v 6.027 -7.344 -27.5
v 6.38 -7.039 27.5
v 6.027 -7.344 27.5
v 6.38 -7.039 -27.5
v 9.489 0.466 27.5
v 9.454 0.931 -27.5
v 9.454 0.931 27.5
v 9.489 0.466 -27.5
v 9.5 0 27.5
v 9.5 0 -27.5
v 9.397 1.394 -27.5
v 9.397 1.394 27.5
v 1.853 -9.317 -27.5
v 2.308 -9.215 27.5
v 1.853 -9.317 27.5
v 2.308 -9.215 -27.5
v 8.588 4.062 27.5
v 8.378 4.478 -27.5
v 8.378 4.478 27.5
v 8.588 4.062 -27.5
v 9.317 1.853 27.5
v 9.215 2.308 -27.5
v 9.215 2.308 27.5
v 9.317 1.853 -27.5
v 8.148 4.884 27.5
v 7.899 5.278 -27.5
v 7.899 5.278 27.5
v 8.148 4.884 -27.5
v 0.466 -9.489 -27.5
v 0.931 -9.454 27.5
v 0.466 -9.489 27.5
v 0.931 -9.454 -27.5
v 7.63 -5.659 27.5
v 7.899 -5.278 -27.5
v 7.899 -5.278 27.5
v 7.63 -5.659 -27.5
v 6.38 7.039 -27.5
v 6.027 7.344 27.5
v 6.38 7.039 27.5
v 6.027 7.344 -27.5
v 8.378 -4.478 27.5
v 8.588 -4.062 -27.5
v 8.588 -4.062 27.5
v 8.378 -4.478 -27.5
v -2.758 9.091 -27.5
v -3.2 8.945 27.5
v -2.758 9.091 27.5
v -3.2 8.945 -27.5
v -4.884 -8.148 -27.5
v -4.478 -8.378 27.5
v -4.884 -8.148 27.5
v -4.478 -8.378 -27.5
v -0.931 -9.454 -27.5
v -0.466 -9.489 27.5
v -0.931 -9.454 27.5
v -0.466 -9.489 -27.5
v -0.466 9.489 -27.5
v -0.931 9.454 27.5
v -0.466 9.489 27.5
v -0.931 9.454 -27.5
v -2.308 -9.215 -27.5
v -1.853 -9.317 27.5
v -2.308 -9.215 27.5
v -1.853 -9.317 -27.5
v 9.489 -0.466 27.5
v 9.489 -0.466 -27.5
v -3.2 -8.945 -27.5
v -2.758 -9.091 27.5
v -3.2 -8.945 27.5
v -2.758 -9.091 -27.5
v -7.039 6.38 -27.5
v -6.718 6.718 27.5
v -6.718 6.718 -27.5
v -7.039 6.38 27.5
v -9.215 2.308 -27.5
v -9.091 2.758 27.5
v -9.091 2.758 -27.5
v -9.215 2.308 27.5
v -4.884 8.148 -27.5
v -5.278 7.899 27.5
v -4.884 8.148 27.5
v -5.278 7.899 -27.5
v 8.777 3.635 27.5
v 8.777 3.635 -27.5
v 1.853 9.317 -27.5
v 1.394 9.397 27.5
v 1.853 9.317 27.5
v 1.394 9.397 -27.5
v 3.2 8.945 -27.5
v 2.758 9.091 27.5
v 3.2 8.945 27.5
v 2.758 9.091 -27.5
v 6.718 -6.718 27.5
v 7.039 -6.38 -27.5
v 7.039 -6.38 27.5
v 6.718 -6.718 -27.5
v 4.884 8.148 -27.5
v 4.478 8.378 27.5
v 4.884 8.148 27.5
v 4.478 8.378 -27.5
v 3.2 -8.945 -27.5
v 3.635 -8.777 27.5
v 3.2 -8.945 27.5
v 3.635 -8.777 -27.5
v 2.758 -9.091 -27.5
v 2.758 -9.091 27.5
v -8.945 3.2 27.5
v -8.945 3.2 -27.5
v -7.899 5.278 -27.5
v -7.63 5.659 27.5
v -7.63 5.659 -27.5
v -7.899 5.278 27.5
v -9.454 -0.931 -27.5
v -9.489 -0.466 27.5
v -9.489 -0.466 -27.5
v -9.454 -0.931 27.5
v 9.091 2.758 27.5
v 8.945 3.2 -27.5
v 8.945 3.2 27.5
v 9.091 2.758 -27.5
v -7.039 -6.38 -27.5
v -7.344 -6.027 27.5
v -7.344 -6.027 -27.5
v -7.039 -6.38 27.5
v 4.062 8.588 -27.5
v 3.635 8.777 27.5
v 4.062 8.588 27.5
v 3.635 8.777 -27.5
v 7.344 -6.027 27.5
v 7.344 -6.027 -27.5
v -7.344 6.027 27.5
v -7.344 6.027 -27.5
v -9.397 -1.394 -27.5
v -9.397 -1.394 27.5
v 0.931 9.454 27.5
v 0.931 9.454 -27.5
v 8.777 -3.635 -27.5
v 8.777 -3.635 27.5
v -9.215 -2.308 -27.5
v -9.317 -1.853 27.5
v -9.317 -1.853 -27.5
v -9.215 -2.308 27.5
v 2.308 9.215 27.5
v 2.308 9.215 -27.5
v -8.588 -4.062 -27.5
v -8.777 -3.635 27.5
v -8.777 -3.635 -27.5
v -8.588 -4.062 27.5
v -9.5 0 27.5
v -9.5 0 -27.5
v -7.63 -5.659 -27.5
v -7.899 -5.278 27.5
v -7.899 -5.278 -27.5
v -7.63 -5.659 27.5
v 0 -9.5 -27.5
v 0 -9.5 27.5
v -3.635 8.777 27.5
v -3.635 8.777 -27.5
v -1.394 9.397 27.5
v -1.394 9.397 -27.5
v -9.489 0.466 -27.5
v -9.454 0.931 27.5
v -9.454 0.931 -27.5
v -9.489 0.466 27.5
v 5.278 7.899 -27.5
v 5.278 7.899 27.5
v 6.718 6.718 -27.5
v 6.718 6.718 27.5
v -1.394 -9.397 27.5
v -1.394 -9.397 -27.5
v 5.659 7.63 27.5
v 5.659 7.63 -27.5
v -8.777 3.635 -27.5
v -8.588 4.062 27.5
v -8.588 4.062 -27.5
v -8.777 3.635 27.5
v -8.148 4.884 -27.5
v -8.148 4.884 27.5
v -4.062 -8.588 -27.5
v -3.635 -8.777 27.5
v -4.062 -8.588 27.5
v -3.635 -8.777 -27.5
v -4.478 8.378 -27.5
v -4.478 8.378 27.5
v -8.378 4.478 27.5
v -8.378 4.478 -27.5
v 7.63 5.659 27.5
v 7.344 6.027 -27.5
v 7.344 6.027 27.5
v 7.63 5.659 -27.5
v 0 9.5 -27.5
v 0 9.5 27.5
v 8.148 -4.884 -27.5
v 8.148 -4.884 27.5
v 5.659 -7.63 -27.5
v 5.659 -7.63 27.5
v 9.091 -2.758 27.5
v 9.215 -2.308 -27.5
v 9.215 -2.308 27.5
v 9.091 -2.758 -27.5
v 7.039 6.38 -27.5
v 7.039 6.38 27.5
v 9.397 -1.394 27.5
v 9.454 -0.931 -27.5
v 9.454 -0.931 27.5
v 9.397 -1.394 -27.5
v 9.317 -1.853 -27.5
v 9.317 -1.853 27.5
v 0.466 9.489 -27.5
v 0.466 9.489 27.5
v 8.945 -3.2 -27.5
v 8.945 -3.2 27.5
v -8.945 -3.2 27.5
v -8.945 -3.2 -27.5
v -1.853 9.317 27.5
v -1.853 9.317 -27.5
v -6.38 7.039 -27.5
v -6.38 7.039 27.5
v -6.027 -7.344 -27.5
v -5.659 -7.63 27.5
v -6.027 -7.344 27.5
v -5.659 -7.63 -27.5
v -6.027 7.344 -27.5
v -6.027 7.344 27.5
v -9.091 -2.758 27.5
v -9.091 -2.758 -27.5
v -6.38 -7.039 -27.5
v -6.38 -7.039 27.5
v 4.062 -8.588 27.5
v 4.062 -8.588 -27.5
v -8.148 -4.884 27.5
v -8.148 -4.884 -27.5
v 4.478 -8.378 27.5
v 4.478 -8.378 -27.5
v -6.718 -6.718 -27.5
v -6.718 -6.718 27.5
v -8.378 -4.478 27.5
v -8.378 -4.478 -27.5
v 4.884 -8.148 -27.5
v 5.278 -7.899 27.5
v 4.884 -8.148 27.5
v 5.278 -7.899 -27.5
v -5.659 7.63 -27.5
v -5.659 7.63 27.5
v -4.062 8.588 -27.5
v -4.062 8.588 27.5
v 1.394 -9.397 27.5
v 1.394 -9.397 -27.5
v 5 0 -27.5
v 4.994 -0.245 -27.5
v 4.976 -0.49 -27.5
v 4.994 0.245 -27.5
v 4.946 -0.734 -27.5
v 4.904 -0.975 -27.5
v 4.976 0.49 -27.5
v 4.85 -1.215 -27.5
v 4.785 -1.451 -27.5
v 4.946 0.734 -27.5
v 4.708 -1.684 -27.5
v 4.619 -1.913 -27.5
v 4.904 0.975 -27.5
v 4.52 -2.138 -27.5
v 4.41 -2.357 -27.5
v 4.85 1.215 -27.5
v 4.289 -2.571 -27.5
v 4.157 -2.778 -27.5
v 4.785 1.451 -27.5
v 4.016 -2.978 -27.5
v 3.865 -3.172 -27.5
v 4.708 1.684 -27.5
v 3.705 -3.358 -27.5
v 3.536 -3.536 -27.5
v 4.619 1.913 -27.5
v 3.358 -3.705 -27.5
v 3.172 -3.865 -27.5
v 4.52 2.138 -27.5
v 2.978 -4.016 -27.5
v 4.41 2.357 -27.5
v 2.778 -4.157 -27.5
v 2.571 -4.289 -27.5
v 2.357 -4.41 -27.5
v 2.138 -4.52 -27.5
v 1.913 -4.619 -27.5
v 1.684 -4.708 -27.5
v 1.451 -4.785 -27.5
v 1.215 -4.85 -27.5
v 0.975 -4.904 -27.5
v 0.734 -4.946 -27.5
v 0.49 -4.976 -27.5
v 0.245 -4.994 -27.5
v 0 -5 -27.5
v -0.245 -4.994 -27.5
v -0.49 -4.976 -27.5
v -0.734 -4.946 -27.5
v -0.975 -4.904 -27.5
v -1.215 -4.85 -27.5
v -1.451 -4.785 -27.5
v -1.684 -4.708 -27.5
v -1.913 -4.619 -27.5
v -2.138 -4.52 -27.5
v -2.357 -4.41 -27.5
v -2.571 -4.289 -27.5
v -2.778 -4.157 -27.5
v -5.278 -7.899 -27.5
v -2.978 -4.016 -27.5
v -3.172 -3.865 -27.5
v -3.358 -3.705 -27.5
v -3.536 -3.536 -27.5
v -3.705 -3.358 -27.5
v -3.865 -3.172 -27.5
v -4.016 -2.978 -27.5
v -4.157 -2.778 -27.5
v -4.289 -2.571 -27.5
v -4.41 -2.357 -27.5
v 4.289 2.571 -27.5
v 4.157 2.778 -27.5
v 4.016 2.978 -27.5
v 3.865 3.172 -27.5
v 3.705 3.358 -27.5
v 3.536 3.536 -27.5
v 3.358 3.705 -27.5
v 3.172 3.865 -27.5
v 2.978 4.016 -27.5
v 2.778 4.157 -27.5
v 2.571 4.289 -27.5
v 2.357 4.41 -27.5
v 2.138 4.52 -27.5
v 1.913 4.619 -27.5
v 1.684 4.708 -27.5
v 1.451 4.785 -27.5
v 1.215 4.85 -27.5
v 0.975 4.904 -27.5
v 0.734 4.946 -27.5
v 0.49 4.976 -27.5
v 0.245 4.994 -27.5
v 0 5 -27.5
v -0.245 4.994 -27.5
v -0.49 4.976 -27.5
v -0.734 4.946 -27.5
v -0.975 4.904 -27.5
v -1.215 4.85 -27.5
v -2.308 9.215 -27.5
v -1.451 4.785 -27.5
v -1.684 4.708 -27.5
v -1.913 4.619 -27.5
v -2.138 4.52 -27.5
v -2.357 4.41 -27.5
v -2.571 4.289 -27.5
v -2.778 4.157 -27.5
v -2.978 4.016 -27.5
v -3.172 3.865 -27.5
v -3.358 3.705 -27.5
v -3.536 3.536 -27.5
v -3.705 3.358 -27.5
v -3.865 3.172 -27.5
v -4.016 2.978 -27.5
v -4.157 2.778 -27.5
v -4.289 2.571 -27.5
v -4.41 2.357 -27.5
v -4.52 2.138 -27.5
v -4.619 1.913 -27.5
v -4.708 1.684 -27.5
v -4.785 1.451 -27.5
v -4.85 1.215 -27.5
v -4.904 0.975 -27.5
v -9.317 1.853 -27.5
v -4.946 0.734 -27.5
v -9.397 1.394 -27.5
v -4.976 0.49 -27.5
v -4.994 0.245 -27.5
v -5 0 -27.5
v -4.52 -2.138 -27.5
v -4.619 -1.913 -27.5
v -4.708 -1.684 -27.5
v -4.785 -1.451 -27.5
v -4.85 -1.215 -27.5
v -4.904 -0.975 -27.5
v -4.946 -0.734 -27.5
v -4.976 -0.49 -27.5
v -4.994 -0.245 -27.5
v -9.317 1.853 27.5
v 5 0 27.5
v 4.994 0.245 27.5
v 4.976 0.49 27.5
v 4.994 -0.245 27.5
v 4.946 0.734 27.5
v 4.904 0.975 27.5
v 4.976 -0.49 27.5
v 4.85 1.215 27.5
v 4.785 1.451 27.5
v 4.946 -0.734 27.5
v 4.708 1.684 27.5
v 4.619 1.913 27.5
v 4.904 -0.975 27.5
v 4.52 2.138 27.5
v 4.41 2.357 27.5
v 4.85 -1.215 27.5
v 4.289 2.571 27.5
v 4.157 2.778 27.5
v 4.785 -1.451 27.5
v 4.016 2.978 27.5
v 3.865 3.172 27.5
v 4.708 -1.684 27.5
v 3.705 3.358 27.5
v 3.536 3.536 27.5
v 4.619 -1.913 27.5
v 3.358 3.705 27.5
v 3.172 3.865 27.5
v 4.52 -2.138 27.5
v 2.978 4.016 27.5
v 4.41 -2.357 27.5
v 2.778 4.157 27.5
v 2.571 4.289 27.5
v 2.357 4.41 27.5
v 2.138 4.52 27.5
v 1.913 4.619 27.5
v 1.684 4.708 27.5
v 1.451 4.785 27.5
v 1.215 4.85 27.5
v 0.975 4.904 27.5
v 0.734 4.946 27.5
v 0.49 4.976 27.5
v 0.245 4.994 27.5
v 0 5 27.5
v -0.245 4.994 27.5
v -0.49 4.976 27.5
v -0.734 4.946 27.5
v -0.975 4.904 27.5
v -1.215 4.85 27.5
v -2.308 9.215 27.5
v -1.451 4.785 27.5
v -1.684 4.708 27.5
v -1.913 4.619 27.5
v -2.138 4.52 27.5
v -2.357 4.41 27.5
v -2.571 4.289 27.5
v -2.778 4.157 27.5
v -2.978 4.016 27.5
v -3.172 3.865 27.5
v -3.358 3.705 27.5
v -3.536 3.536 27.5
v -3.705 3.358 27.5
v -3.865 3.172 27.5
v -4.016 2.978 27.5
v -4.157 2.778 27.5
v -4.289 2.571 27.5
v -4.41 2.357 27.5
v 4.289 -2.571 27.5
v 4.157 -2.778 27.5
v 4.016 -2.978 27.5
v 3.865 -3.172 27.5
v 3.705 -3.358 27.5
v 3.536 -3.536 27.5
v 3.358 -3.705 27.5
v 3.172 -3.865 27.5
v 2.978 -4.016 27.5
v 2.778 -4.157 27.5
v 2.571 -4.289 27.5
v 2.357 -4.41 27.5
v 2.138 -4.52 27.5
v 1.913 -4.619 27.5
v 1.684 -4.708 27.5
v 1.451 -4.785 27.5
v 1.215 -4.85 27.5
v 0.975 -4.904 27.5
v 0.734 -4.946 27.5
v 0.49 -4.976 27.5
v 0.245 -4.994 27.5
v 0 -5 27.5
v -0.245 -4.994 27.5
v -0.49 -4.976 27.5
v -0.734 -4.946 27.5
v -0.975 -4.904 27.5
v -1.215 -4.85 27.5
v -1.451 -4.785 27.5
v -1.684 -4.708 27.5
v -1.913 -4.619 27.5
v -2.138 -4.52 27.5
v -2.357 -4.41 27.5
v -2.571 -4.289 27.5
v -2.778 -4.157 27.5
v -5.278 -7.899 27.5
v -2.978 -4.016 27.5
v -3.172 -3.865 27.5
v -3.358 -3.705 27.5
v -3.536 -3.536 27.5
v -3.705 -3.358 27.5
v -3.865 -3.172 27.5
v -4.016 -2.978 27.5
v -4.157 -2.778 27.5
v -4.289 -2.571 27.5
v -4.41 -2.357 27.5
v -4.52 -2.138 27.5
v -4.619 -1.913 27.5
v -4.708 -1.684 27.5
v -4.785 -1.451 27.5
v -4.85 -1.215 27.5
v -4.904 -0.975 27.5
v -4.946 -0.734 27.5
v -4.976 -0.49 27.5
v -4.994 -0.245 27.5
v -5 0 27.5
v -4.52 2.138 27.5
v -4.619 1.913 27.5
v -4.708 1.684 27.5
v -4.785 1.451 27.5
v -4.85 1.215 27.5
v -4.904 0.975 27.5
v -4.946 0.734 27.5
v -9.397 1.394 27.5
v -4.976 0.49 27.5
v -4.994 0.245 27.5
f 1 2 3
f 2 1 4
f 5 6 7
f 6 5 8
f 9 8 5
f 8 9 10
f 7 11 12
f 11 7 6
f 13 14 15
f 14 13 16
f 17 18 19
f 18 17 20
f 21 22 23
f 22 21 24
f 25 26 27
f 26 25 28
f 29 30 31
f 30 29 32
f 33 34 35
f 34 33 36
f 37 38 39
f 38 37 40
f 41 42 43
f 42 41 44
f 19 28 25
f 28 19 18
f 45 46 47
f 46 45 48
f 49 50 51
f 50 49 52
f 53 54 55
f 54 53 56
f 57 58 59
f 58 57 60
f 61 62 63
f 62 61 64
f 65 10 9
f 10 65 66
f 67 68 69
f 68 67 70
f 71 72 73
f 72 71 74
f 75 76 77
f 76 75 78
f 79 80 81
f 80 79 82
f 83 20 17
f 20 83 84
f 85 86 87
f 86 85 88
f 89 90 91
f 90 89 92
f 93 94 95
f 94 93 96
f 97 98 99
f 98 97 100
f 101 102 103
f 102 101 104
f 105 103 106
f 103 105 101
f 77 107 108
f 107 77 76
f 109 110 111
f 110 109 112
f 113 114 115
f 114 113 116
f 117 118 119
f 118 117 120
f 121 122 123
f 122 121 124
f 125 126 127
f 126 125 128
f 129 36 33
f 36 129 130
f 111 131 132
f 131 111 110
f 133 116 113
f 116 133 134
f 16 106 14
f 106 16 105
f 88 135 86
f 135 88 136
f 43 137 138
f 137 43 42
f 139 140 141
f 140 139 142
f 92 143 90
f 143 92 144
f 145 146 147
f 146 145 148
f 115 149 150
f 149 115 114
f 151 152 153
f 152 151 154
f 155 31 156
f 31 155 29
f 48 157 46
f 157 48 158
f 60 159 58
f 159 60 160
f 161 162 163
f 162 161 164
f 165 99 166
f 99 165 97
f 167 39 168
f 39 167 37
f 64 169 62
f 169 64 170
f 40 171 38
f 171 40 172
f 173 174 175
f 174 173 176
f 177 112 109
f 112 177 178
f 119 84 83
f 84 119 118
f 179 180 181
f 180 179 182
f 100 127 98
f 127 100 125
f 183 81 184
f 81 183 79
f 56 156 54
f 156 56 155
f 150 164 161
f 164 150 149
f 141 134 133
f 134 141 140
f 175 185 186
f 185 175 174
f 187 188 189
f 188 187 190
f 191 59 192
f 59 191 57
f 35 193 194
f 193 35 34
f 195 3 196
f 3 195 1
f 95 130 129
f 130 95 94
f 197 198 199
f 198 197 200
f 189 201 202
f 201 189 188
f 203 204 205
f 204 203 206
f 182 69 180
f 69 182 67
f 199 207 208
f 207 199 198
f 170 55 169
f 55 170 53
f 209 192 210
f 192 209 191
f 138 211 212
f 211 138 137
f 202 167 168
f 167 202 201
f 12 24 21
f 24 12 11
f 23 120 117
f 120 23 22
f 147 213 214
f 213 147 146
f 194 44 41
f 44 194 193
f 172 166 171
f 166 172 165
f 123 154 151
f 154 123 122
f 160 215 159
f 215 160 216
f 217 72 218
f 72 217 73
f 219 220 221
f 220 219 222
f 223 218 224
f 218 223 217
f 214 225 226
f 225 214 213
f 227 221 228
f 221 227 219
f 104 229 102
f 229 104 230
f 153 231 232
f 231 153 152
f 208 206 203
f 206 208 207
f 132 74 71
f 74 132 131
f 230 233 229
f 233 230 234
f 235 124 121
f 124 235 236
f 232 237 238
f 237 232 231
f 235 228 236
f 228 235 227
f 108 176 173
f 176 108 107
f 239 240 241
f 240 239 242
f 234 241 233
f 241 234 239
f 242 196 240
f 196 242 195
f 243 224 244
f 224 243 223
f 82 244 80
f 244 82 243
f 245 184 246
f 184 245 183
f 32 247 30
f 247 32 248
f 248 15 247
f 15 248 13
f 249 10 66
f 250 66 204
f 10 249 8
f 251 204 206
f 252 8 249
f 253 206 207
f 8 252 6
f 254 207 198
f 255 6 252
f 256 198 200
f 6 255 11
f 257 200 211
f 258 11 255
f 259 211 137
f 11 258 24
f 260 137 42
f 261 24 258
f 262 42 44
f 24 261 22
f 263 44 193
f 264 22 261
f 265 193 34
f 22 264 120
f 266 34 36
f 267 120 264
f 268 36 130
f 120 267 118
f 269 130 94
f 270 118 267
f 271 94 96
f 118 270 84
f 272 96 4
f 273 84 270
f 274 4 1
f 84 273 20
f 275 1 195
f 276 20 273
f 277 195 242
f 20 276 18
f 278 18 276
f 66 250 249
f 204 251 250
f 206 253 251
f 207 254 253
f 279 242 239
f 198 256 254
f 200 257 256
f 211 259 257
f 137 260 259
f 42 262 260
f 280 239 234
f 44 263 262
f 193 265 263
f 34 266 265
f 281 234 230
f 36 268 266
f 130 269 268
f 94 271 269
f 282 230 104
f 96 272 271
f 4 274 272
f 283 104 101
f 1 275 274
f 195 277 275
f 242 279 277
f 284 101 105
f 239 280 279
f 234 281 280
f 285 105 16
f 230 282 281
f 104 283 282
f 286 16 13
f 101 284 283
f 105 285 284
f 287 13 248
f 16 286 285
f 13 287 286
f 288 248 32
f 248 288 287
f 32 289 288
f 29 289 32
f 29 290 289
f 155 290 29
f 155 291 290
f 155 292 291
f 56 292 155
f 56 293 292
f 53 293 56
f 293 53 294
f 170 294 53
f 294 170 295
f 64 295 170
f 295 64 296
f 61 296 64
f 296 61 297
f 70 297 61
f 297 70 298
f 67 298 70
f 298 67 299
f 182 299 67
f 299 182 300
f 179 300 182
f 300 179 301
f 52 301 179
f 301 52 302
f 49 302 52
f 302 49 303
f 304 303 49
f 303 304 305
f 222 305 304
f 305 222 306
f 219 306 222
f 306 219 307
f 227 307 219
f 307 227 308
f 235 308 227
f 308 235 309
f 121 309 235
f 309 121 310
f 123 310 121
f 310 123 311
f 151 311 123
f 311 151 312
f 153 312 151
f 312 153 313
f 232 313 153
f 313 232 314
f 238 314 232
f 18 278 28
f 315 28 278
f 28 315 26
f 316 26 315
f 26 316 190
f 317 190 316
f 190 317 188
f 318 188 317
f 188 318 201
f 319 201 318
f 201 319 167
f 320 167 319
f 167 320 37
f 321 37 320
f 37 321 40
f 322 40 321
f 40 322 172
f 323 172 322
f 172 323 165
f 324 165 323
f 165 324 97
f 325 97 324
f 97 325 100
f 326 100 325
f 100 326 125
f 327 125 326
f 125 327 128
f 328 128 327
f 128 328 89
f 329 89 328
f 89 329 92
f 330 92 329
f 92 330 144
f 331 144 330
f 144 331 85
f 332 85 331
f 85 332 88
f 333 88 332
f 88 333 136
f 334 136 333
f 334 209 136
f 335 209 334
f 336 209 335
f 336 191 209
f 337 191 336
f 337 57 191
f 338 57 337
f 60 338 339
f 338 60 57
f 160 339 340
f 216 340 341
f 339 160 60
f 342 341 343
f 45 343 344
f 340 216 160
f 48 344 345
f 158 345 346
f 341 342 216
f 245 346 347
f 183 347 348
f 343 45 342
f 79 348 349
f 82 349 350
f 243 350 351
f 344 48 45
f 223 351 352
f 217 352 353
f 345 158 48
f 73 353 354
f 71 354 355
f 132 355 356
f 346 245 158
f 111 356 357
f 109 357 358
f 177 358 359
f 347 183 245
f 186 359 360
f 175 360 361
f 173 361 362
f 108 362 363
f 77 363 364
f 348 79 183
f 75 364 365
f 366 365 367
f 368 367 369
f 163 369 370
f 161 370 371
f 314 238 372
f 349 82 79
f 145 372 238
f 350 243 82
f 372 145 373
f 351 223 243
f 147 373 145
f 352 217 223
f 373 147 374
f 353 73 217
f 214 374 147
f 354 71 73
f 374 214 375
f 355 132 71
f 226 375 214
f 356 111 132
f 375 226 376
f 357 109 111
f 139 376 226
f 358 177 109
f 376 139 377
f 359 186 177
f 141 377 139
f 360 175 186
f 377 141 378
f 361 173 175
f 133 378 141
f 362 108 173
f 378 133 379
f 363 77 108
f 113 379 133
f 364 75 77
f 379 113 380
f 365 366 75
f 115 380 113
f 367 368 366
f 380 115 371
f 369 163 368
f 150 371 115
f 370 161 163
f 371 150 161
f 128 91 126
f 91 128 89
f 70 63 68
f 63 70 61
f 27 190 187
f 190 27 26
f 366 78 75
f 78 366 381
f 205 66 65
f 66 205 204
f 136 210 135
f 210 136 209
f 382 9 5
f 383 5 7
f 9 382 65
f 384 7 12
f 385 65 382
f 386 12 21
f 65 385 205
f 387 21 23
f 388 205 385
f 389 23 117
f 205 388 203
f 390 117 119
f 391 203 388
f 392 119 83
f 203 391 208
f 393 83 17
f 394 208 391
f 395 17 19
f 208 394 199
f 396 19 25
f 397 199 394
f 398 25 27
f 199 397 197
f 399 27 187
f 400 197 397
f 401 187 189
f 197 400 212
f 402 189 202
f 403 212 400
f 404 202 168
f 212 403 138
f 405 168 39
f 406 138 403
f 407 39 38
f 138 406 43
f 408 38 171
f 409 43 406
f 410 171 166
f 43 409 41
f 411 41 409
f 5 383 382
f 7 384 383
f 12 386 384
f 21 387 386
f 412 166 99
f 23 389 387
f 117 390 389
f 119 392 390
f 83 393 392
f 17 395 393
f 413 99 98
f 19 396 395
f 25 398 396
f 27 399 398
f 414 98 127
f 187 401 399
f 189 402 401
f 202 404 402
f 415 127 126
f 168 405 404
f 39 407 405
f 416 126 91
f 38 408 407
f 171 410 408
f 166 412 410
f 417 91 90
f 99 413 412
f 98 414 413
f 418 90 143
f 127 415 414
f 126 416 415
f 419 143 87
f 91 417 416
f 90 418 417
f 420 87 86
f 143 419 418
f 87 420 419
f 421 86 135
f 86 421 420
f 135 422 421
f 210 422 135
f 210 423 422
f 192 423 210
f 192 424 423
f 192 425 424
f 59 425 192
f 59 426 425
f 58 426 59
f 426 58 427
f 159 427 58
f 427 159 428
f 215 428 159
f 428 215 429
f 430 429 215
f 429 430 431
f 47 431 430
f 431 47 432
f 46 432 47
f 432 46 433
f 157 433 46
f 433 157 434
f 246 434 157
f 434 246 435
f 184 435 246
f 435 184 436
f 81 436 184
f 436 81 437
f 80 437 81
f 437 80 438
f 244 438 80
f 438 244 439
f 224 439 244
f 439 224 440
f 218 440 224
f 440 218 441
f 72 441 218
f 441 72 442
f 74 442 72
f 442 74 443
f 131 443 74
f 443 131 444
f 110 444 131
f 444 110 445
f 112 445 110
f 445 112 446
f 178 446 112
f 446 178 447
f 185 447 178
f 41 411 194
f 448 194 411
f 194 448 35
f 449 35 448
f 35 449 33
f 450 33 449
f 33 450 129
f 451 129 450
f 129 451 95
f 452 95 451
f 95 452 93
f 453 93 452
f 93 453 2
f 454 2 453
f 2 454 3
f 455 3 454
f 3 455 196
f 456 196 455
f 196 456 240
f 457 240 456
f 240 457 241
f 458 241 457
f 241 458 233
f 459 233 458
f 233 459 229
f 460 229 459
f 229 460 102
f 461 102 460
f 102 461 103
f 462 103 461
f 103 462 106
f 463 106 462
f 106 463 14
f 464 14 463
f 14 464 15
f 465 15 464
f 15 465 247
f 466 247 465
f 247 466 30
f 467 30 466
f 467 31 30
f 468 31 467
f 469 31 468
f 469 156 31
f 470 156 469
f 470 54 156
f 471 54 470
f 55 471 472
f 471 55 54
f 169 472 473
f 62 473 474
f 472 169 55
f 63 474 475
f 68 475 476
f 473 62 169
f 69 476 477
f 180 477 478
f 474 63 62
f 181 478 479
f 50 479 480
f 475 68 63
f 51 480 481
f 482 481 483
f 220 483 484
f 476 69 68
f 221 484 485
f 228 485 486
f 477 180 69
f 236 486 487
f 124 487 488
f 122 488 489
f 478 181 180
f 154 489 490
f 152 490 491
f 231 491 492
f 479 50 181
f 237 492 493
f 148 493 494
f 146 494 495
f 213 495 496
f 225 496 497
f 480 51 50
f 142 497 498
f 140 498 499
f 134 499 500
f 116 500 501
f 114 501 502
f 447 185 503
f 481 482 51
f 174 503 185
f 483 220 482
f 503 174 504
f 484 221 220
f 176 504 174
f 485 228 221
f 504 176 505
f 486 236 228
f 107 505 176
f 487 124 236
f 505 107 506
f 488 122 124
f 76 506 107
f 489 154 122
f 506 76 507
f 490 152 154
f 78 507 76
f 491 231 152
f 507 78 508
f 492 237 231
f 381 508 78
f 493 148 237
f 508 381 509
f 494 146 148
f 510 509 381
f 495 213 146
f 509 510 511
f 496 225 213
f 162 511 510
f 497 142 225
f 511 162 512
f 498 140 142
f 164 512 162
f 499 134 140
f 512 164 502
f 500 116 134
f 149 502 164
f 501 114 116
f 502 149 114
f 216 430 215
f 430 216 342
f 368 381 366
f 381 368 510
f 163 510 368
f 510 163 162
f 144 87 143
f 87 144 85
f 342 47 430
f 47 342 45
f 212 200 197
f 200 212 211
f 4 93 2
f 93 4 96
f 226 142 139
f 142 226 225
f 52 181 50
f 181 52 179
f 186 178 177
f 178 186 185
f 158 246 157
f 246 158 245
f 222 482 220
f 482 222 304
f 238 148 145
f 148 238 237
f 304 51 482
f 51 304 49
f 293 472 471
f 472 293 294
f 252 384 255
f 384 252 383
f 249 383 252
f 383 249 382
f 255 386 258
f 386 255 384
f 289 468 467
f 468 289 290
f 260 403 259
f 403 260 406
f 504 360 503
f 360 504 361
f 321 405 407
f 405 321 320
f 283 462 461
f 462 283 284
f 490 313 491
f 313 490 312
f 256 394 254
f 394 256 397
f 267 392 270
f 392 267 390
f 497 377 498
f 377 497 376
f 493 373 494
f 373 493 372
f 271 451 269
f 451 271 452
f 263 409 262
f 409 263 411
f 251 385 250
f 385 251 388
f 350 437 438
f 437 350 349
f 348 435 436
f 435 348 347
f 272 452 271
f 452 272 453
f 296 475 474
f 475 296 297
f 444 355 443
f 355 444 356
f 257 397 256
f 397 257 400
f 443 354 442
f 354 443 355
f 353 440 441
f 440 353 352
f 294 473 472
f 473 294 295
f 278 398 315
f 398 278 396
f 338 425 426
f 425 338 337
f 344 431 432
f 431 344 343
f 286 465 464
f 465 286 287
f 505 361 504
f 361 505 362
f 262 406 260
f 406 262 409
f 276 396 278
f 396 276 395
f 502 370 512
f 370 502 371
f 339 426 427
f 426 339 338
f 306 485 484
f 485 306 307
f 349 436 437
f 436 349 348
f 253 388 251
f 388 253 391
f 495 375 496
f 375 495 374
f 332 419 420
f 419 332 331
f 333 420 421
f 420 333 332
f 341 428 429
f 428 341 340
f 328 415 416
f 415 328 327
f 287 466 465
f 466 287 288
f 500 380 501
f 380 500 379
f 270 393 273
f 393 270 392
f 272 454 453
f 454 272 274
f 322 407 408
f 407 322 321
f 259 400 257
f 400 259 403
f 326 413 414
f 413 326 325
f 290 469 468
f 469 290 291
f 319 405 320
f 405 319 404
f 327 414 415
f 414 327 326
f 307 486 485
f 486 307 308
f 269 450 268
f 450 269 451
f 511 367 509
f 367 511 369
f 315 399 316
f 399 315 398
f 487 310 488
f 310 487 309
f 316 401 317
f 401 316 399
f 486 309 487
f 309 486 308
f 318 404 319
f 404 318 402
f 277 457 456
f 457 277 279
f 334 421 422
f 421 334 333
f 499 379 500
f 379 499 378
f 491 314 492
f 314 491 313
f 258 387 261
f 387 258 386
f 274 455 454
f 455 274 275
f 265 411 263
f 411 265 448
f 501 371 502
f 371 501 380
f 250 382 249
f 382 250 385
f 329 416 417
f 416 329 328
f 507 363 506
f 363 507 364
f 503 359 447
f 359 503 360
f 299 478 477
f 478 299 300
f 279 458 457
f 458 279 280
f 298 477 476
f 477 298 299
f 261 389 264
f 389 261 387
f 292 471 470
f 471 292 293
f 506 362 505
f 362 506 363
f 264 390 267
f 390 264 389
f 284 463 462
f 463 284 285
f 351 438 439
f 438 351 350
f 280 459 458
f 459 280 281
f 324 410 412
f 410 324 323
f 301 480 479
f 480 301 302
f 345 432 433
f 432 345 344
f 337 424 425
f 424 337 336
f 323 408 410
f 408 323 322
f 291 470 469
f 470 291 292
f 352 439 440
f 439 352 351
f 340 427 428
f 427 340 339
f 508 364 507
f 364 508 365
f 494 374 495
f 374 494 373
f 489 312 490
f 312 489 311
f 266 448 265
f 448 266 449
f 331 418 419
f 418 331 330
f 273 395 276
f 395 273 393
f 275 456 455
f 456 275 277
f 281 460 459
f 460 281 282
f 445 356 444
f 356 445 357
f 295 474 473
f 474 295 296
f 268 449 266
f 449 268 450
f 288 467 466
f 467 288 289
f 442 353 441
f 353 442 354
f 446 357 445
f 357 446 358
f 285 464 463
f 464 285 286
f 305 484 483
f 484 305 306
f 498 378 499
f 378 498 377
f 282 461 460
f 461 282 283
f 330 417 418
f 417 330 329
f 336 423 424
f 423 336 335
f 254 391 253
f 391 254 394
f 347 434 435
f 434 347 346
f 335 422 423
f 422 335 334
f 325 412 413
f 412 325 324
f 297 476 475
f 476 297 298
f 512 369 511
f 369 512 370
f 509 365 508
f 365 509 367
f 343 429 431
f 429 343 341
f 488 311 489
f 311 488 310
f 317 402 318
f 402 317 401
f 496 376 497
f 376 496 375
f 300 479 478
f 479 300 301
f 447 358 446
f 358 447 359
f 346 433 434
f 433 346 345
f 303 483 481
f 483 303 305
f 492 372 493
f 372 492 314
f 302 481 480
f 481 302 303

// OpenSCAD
$fn=128;

bore_d = 10.0;
od_d = 19.0;
len = 55.0;

module linear_bearing(bore_d, od_d, len) {
    difference() {
        cylinder(d=od_d, h=len, center=true);
        cylinder(d=bore_d, h=len+0.2, center=true);
    }
}

linear_bearing(bore_d, od_d, len);
